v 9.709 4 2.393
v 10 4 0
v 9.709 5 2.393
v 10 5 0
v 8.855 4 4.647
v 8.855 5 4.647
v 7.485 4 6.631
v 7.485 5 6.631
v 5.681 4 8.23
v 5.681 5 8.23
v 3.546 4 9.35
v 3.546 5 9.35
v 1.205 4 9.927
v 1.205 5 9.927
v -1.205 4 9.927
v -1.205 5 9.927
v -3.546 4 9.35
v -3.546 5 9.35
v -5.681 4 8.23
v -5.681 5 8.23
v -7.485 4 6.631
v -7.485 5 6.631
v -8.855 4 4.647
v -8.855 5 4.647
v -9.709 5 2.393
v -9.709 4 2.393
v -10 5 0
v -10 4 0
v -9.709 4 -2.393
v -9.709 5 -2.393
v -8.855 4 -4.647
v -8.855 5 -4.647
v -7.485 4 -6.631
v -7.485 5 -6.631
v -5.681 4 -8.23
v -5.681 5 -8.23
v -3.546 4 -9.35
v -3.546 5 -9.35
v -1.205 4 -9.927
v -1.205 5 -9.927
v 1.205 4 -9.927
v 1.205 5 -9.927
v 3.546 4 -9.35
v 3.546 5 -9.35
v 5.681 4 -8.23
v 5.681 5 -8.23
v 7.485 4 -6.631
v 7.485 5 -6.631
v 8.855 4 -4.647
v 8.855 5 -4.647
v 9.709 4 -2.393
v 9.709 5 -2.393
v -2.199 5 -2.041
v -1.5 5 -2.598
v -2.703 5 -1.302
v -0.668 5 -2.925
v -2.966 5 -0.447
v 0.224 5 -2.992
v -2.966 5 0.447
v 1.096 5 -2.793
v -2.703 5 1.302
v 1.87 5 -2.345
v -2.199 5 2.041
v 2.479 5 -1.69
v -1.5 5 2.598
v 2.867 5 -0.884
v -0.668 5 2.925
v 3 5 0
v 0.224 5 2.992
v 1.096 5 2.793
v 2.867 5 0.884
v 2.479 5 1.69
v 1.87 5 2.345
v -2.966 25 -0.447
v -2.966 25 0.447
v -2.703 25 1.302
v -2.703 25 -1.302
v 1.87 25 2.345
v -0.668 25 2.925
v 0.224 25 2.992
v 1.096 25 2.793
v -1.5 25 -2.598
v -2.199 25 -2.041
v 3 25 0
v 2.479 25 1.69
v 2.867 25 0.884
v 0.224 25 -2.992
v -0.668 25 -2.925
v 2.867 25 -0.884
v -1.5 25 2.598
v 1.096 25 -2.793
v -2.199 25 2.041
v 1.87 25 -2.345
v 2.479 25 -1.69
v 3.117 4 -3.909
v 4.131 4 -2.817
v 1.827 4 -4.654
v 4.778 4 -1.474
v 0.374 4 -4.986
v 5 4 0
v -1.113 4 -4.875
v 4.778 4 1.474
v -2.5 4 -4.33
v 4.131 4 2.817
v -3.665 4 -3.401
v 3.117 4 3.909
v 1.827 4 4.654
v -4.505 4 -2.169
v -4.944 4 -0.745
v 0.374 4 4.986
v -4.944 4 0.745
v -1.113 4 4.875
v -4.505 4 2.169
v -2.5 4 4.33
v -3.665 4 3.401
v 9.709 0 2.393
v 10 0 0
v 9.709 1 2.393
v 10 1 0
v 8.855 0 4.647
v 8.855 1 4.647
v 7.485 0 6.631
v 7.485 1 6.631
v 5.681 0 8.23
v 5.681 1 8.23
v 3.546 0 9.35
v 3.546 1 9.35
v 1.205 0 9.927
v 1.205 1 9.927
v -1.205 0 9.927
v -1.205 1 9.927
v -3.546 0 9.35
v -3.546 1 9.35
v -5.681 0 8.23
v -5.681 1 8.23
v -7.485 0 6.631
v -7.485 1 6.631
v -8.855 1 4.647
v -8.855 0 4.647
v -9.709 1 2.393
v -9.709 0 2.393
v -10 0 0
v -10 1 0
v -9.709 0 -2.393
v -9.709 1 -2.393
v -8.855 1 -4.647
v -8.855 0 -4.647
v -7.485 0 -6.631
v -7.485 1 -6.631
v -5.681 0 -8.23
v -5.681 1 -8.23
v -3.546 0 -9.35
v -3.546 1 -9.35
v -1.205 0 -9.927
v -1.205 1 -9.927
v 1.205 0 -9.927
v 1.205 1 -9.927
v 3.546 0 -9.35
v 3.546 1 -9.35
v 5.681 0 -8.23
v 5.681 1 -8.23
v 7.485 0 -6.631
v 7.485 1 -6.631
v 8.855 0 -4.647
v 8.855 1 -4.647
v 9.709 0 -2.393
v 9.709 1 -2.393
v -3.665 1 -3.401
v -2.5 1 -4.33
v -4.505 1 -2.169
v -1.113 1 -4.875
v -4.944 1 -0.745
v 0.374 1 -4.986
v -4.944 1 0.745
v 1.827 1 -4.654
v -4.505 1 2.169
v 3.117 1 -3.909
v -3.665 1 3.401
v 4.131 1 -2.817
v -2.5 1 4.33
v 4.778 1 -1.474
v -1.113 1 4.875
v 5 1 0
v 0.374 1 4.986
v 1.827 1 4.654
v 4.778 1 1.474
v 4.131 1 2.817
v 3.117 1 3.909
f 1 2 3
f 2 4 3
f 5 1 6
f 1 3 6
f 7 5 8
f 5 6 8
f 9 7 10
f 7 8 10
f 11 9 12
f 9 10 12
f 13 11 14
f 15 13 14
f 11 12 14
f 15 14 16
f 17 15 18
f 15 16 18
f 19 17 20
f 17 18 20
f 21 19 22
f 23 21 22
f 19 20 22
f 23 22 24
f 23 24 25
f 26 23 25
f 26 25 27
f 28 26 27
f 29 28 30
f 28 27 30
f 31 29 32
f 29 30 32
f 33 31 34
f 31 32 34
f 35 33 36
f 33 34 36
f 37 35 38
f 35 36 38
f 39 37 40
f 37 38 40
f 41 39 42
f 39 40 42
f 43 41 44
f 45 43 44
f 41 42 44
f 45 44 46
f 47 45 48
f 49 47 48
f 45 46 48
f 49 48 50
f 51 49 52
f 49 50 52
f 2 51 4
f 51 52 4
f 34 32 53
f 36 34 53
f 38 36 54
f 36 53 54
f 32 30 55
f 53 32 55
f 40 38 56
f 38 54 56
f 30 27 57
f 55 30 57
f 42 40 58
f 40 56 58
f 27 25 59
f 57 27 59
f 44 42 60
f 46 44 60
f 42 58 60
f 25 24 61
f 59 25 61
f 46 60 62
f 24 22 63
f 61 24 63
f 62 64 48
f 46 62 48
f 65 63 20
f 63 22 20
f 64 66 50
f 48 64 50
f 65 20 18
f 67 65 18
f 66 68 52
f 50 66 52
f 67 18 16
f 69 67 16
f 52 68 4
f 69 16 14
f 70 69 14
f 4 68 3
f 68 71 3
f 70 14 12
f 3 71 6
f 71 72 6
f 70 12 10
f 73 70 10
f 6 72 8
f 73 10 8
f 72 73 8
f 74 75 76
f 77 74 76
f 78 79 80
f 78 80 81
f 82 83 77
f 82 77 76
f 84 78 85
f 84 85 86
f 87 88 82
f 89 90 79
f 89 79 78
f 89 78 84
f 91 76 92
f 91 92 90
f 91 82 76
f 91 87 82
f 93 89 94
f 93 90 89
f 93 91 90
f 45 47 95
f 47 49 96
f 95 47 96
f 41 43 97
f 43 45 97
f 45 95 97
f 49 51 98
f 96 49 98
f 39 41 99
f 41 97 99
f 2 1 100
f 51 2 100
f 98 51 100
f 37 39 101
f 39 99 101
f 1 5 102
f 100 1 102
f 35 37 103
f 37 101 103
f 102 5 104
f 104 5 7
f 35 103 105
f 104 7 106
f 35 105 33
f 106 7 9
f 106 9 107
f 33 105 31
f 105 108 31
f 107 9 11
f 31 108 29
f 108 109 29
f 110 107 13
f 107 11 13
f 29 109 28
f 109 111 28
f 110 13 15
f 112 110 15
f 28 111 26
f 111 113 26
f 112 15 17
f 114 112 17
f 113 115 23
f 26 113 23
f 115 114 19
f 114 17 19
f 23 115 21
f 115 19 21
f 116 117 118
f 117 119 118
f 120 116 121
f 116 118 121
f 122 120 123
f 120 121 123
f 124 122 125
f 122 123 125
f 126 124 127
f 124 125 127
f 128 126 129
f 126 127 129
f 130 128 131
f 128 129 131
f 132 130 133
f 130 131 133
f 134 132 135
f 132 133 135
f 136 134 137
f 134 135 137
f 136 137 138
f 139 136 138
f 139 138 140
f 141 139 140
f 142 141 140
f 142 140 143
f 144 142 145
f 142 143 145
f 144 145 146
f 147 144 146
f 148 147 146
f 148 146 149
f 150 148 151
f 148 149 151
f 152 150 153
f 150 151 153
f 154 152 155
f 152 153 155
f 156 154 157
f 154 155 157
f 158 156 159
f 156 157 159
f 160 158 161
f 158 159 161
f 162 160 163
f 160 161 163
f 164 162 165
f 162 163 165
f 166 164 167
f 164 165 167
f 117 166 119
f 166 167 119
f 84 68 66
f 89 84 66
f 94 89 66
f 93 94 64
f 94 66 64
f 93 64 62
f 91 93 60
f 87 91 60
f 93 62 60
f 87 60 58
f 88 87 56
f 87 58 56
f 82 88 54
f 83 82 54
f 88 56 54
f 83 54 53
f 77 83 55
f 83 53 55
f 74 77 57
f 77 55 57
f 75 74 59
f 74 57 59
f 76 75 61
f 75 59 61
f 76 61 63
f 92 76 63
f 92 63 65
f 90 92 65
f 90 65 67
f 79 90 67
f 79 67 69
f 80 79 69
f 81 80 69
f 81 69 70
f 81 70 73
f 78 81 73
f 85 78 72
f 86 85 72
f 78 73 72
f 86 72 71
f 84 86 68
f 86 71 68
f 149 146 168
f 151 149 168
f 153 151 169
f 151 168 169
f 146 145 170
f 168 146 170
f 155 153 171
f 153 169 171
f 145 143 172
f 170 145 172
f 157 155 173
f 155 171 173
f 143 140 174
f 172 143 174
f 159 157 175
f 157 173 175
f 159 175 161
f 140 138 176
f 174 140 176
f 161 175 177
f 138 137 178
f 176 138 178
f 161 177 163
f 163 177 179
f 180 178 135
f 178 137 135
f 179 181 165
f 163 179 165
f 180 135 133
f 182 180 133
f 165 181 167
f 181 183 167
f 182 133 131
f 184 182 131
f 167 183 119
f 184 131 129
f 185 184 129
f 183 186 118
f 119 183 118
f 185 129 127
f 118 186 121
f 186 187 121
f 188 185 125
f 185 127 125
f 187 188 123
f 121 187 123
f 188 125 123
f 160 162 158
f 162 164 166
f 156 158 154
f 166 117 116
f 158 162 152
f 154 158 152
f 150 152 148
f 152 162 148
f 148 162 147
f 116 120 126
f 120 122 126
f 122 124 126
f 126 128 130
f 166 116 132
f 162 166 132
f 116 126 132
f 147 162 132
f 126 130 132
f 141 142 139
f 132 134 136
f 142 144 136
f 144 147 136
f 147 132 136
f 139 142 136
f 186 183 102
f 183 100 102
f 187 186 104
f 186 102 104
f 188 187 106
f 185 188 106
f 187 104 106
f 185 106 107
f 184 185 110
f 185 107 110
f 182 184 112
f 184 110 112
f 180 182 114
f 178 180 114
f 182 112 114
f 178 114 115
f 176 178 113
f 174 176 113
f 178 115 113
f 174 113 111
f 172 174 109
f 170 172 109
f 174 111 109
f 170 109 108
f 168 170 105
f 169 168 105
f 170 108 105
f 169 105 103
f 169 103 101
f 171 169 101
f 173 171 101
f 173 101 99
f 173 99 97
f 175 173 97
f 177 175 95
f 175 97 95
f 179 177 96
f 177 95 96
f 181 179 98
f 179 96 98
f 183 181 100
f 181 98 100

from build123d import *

# Parameters (mm, degrees)
SKETCH2_R           = 3
BOSS_EXTRUDE1_DEPTH = 20


with BuildPart() as part:
    # Sketch1 → Revolve1 (revolve)
    with BuildSketch(Plane.XY):
        Polygon((0, 0), (10, 0), (10, 1), (5, 1), (5, 4), (10, 4), (10, 5), (0, 5), align=None)
    revolve(axis=Axis((0, 5, 0), (0, -1, 0)))

    # Sketch2 → Boss-Extrude1 (add)
    with BuildSketch(Plane(origin=(0, 5, 0), x_dir=(1, 0, 0), z_dir=(0, 1, 0))):
        Circle(SKETCH2_R)
    extrude(amount=BOSS_EXTRUDE1_DEPTH)


solid = part.part
